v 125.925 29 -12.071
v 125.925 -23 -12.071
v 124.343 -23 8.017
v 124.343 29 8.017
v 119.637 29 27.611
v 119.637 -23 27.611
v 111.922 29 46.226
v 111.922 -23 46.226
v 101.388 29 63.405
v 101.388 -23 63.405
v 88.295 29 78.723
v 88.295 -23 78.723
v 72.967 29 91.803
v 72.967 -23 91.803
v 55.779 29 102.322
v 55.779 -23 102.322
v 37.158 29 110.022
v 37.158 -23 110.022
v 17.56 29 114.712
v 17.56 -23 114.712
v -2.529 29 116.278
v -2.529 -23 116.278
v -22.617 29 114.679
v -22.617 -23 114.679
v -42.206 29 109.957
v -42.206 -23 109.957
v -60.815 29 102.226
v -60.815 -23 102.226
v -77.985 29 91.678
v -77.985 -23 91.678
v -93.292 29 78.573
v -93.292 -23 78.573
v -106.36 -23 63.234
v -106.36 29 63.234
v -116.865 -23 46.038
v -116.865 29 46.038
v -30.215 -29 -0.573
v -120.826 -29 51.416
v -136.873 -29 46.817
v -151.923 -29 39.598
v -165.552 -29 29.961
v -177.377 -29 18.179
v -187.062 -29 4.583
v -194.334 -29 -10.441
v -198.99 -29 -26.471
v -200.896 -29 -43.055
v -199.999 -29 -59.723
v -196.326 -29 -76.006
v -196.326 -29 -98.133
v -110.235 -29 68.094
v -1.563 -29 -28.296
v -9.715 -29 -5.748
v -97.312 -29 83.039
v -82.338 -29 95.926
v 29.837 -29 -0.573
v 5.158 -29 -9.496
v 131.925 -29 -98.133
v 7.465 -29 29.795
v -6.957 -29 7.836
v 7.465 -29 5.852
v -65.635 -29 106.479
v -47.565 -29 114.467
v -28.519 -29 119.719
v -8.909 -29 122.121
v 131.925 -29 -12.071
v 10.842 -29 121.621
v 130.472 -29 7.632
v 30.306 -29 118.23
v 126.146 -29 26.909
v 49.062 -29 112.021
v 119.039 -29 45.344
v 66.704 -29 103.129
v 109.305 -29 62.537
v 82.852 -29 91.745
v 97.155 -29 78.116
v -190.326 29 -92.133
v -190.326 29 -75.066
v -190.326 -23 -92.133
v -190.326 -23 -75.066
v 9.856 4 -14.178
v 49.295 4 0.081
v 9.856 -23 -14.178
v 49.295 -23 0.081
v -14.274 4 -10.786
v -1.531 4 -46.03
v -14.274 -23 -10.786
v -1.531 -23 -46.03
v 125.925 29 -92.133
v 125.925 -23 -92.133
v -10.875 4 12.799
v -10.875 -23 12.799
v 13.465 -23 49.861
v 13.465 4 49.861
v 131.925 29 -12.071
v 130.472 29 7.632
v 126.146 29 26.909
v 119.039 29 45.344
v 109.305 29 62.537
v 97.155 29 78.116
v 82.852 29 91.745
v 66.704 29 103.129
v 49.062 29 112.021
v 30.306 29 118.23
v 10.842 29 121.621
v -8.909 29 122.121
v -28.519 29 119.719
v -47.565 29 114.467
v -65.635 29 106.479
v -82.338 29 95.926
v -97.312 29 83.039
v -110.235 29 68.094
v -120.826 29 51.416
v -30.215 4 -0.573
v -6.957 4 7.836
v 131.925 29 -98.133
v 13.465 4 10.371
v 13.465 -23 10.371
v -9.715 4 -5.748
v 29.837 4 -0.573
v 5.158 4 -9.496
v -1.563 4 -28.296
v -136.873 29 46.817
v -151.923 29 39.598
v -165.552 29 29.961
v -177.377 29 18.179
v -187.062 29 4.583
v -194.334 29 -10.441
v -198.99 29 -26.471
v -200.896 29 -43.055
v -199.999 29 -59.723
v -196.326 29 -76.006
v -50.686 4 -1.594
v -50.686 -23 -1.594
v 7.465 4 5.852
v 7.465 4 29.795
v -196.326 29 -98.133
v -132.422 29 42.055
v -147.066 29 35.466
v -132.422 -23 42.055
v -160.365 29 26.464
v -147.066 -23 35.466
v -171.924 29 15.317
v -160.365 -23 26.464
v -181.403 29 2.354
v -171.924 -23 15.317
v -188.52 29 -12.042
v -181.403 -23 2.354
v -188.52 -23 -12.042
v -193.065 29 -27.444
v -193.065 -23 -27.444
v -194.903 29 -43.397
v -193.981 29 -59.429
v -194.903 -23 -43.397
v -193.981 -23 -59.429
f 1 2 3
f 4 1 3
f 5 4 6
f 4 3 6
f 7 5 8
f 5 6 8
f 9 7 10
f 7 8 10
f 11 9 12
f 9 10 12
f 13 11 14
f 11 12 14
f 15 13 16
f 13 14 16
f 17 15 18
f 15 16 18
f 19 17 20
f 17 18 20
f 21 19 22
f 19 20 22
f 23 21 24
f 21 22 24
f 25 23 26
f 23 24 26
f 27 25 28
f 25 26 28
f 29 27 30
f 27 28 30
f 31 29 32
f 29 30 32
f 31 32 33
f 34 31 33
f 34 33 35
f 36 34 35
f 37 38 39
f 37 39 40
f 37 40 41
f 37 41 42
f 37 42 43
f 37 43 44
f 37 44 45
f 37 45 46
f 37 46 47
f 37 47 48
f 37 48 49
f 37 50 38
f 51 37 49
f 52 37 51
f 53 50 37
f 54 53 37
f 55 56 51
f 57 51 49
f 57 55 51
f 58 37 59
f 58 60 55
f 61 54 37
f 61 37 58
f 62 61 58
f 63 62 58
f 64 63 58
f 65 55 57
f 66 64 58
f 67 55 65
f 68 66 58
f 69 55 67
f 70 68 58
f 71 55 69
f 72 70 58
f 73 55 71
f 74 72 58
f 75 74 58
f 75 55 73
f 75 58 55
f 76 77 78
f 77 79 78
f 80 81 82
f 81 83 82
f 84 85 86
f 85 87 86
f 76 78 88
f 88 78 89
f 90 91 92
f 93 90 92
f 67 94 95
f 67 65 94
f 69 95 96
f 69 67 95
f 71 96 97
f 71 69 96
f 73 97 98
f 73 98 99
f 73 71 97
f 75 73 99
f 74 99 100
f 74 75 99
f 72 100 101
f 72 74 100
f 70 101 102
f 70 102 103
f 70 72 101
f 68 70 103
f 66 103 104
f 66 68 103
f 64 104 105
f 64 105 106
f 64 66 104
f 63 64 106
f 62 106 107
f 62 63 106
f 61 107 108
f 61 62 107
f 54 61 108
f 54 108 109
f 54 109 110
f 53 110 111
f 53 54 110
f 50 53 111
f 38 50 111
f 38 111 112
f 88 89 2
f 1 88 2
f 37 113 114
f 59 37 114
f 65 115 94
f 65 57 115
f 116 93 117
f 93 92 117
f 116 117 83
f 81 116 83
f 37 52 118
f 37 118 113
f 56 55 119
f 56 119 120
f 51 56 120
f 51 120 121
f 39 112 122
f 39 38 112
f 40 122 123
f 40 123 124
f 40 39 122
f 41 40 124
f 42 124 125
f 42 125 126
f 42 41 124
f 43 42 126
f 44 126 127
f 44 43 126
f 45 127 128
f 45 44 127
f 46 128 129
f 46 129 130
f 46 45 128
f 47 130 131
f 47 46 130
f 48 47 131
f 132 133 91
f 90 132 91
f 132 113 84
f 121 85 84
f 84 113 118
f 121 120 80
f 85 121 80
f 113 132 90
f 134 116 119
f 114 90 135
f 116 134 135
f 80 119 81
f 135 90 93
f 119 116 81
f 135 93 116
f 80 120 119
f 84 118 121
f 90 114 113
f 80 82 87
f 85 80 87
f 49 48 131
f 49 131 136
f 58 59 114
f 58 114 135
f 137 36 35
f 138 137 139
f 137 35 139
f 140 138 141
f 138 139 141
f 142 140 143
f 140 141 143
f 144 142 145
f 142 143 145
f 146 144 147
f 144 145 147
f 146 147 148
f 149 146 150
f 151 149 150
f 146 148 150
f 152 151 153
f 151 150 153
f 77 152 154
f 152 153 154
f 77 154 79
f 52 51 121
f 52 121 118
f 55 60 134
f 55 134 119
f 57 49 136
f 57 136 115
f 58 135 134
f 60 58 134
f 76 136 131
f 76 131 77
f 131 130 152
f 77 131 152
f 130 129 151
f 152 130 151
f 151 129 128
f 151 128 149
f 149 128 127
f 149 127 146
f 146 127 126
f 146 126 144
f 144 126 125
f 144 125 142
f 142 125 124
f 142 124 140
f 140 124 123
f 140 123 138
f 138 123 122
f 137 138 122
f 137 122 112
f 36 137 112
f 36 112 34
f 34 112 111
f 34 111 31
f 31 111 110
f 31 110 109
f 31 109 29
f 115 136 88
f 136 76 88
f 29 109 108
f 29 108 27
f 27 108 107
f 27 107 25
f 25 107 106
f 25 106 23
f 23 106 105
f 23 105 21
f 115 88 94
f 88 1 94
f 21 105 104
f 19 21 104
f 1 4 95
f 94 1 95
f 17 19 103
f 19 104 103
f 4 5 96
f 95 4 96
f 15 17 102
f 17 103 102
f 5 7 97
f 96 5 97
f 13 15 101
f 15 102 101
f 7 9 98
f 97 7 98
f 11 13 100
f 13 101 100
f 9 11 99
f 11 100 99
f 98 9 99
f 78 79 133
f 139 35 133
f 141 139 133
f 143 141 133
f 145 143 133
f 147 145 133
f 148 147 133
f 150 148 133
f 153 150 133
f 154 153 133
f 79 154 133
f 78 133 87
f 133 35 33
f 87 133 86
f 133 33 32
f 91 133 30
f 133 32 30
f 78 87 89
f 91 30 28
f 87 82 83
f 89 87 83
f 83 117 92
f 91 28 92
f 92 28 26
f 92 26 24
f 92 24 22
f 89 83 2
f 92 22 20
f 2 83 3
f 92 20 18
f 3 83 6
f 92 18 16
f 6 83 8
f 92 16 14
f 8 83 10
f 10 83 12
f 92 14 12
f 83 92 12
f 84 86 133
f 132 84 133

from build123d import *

# Parameters (mm, degrees)
F1_DEPTH = 29
F2_T     = -6
F3_DEPTH = 25


with BuildPart() as f1:
    # F0 (on Front) → F1 (new body, symmetric)
    with BuildSketch(Plane.XZ):
        with BuildLine():
            ThreePointArc((-120.8260423411, 51.4157625441), (-187.0617060927, 4.5833458701), (-196.3255107403, -76.005861395))
            Line((-196.3255107403, -76.005861395), (-196.3255107403, -98.1331872754))
            Line((-196.3255107403, -98.1331872754), (131.9251656532, -98.1331872754))
            Line((131.9251656532, -98.1331872754), (131.9251656532, -12.0712618296))
            ThreePointArc((131.9251656532, -12.0712618296), (30.305701886, 118.2300959975), (-120.8260423411, 51.4157625441))
        make_face()
        Polygon((-6.9567829963, 7.8355963742), (7.4647014605, 29.7945929541), (7.4647014605, 5.8520050569), (29.8372825252, -0.5733477102), (5.157555885, -9.4960665254), (-1.5632266534, -28.2956225947), (-9.7149439706, -5.7484417182), (-30.2154383046, -0.5733477102), align=None, mode=Mode.SUBTRACT)
    extrude(amount=F1_DEPTH, both=True)

    # F2
    f2_openings = [f1.faces().sort_by_distance(p)[0] for p in [
        (-24.069306, 29, -4.408664),
    ]]
    offset(amount=F2_T, openings=f2_openings, kind=Kind.INTERSECTION)

    # F3 (cut): a face of the model
    f3_faces = [f1.faces().sort_by_distance(p)[0] for p in [
        (2.4525988659, 29, 30.5693044377),
    ]]
    extrude(f3_faces, amount=-F3_DEPTH, mode=Mode.SUBTRACT)


solid = f1.part
